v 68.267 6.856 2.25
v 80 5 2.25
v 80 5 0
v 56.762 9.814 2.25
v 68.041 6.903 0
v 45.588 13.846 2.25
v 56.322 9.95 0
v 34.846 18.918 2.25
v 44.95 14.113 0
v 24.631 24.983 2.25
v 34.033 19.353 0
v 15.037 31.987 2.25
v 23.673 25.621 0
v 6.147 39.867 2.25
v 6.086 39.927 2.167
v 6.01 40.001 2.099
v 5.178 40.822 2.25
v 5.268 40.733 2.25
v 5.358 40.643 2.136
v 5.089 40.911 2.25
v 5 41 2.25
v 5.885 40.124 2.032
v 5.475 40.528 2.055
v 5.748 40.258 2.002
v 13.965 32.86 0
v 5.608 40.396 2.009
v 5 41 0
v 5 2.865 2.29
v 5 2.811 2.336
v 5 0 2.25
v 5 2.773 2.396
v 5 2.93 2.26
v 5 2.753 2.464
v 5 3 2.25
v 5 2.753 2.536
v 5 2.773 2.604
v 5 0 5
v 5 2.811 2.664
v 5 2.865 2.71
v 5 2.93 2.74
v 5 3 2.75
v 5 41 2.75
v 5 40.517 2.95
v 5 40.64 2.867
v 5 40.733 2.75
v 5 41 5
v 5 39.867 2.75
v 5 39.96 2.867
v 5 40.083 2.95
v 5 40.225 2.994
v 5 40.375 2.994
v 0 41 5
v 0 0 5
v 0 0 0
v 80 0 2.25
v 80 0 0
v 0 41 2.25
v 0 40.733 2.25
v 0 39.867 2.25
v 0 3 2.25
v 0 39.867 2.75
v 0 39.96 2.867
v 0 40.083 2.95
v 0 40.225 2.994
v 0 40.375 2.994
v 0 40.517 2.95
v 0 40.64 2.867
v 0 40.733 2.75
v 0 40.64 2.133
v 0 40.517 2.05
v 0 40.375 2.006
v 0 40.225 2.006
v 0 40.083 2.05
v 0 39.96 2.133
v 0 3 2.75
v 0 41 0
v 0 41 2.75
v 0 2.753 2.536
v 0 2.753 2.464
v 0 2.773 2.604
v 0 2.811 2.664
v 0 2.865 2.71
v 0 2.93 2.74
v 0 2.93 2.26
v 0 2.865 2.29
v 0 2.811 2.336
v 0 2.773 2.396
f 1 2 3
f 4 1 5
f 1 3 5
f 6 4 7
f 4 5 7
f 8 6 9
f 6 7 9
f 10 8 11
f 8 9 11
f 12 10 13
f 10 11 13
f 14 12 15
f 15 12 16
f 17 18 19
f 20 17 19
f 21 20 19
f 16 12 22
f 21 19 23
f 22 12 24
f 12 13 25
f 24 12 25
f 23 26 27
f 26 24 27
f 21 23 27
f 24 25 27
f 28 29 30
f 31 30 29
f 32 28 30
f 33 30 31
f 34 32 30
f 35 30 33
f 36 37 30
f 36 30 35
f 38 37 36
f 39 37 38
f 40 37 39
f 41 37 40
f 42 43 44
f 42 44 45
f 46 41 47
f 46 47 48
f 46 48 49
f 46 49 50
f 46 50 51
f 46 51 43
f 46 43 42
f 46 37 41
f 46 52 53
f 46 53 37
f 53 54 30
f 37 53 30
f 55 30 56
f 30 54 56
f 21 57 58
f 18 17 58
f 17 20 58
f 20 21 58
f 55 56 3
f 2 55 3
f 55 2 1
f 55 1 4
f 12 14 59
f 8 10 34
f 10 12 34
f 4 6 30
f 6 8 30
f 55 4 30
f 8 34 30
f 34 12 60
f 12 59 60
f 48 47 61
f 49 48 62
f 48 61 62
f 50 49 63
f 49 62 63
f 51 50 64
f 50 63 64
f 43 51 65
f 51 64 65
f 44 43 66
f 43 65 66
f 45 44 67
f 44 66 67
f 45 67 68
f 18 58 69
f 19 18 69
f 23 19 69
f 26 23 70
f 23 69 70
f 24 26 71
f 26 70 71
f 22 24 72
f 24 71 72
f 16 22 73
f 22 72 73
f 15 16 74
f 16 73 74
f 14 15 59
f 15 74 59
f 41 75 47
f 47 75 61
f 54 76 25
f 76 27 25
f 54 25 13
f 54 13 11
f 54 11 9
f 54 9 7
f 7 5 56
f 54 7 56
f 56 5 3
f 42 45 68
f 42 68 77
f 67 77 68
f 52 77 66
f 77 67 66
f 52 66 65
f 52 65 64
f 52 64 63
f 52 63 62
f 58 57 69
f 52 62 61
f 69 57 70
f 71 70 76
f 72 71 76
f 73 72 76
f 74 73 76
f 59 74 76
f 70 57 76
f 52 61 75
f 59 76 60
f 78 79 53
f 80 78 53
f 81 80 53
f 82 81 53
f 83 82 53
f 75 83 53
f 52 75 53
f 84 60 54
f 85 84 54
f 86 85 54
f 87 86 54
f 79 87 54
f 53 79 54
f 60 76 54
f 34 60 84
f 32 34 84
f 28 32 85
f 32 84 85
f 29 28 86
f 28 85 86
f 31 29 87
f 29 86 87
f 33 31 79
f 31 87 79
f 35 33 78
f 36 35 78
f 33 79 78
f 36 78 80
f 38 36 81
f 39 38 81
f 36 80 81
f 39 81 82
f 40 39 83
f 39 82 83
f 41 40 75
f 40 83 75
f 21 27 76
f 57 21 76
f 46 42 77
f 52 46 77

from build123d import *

# Parameters (mm, degrees)
F1_DEPTH = 5
F3_DEPTH = 1000
F4_R     = 0.5
F5_DEPTH = 25
F6_W     = 75
F6_H     = 41
F7_DEPTH = 2.75


with BuildPart() as f1:
    # F0 (on Top) → F1 (new body)
    with BuildSketch(Plane.XY):
        with BuildLine():
            Line((0, 41), (0, 0))
            Line((0, 0), (80, 0))
            Line((80, 0), (80, 5))
            ThreePointArc((80, 5), (39.428626, 16.601304), (5, 41))
            Line((5, 41), (0, 41))
        make_face()
    extrude(amount=F1_DEPTH)

    # F2 (on face) → F3 (cut)
    with BuildSketch(Plane(origin=(0, 0, 0), x_dir=(0, -1, 0), z_dir=(-1, 0, 0))):
        with BuildLine():
            Line((-41, 2.75), (-41, 2.25))
            Line((-41, 2.25), (-3, 2.25))
            ThreePointArc((-3, 2.25), (-2.75, 2.5), (-3, 2.75))
            Line((-3, 2.75), (-41, 2.75))
        make_face()
    extrude(amount=-F3_DEPTH, mode=Mode.SUBTRACT)

    # F4 (on face) → F5 (cut)
    with BuildSketch(Plane(origin=(0, 0, 0), x_dir=(0, -1, 0), z_dir=(-1, 0, 0))):
        with Locations((-40.3, 2.5)):
            Circle(F4_R)
    extrude(amount=-F5_DEPTH, mode=Mode.SUBTRACT)

    # F6 (on face) → F7 (cut)
    with BuildSketch(Plane.XY.offset(5)):
        with Locations((42.5, 20.5)):
            Rectangle(F6_W, F6_H)
    extrude(amount=-F7_DEPTH, mode=Mode.SUBTRACT)


solid = f1.part
